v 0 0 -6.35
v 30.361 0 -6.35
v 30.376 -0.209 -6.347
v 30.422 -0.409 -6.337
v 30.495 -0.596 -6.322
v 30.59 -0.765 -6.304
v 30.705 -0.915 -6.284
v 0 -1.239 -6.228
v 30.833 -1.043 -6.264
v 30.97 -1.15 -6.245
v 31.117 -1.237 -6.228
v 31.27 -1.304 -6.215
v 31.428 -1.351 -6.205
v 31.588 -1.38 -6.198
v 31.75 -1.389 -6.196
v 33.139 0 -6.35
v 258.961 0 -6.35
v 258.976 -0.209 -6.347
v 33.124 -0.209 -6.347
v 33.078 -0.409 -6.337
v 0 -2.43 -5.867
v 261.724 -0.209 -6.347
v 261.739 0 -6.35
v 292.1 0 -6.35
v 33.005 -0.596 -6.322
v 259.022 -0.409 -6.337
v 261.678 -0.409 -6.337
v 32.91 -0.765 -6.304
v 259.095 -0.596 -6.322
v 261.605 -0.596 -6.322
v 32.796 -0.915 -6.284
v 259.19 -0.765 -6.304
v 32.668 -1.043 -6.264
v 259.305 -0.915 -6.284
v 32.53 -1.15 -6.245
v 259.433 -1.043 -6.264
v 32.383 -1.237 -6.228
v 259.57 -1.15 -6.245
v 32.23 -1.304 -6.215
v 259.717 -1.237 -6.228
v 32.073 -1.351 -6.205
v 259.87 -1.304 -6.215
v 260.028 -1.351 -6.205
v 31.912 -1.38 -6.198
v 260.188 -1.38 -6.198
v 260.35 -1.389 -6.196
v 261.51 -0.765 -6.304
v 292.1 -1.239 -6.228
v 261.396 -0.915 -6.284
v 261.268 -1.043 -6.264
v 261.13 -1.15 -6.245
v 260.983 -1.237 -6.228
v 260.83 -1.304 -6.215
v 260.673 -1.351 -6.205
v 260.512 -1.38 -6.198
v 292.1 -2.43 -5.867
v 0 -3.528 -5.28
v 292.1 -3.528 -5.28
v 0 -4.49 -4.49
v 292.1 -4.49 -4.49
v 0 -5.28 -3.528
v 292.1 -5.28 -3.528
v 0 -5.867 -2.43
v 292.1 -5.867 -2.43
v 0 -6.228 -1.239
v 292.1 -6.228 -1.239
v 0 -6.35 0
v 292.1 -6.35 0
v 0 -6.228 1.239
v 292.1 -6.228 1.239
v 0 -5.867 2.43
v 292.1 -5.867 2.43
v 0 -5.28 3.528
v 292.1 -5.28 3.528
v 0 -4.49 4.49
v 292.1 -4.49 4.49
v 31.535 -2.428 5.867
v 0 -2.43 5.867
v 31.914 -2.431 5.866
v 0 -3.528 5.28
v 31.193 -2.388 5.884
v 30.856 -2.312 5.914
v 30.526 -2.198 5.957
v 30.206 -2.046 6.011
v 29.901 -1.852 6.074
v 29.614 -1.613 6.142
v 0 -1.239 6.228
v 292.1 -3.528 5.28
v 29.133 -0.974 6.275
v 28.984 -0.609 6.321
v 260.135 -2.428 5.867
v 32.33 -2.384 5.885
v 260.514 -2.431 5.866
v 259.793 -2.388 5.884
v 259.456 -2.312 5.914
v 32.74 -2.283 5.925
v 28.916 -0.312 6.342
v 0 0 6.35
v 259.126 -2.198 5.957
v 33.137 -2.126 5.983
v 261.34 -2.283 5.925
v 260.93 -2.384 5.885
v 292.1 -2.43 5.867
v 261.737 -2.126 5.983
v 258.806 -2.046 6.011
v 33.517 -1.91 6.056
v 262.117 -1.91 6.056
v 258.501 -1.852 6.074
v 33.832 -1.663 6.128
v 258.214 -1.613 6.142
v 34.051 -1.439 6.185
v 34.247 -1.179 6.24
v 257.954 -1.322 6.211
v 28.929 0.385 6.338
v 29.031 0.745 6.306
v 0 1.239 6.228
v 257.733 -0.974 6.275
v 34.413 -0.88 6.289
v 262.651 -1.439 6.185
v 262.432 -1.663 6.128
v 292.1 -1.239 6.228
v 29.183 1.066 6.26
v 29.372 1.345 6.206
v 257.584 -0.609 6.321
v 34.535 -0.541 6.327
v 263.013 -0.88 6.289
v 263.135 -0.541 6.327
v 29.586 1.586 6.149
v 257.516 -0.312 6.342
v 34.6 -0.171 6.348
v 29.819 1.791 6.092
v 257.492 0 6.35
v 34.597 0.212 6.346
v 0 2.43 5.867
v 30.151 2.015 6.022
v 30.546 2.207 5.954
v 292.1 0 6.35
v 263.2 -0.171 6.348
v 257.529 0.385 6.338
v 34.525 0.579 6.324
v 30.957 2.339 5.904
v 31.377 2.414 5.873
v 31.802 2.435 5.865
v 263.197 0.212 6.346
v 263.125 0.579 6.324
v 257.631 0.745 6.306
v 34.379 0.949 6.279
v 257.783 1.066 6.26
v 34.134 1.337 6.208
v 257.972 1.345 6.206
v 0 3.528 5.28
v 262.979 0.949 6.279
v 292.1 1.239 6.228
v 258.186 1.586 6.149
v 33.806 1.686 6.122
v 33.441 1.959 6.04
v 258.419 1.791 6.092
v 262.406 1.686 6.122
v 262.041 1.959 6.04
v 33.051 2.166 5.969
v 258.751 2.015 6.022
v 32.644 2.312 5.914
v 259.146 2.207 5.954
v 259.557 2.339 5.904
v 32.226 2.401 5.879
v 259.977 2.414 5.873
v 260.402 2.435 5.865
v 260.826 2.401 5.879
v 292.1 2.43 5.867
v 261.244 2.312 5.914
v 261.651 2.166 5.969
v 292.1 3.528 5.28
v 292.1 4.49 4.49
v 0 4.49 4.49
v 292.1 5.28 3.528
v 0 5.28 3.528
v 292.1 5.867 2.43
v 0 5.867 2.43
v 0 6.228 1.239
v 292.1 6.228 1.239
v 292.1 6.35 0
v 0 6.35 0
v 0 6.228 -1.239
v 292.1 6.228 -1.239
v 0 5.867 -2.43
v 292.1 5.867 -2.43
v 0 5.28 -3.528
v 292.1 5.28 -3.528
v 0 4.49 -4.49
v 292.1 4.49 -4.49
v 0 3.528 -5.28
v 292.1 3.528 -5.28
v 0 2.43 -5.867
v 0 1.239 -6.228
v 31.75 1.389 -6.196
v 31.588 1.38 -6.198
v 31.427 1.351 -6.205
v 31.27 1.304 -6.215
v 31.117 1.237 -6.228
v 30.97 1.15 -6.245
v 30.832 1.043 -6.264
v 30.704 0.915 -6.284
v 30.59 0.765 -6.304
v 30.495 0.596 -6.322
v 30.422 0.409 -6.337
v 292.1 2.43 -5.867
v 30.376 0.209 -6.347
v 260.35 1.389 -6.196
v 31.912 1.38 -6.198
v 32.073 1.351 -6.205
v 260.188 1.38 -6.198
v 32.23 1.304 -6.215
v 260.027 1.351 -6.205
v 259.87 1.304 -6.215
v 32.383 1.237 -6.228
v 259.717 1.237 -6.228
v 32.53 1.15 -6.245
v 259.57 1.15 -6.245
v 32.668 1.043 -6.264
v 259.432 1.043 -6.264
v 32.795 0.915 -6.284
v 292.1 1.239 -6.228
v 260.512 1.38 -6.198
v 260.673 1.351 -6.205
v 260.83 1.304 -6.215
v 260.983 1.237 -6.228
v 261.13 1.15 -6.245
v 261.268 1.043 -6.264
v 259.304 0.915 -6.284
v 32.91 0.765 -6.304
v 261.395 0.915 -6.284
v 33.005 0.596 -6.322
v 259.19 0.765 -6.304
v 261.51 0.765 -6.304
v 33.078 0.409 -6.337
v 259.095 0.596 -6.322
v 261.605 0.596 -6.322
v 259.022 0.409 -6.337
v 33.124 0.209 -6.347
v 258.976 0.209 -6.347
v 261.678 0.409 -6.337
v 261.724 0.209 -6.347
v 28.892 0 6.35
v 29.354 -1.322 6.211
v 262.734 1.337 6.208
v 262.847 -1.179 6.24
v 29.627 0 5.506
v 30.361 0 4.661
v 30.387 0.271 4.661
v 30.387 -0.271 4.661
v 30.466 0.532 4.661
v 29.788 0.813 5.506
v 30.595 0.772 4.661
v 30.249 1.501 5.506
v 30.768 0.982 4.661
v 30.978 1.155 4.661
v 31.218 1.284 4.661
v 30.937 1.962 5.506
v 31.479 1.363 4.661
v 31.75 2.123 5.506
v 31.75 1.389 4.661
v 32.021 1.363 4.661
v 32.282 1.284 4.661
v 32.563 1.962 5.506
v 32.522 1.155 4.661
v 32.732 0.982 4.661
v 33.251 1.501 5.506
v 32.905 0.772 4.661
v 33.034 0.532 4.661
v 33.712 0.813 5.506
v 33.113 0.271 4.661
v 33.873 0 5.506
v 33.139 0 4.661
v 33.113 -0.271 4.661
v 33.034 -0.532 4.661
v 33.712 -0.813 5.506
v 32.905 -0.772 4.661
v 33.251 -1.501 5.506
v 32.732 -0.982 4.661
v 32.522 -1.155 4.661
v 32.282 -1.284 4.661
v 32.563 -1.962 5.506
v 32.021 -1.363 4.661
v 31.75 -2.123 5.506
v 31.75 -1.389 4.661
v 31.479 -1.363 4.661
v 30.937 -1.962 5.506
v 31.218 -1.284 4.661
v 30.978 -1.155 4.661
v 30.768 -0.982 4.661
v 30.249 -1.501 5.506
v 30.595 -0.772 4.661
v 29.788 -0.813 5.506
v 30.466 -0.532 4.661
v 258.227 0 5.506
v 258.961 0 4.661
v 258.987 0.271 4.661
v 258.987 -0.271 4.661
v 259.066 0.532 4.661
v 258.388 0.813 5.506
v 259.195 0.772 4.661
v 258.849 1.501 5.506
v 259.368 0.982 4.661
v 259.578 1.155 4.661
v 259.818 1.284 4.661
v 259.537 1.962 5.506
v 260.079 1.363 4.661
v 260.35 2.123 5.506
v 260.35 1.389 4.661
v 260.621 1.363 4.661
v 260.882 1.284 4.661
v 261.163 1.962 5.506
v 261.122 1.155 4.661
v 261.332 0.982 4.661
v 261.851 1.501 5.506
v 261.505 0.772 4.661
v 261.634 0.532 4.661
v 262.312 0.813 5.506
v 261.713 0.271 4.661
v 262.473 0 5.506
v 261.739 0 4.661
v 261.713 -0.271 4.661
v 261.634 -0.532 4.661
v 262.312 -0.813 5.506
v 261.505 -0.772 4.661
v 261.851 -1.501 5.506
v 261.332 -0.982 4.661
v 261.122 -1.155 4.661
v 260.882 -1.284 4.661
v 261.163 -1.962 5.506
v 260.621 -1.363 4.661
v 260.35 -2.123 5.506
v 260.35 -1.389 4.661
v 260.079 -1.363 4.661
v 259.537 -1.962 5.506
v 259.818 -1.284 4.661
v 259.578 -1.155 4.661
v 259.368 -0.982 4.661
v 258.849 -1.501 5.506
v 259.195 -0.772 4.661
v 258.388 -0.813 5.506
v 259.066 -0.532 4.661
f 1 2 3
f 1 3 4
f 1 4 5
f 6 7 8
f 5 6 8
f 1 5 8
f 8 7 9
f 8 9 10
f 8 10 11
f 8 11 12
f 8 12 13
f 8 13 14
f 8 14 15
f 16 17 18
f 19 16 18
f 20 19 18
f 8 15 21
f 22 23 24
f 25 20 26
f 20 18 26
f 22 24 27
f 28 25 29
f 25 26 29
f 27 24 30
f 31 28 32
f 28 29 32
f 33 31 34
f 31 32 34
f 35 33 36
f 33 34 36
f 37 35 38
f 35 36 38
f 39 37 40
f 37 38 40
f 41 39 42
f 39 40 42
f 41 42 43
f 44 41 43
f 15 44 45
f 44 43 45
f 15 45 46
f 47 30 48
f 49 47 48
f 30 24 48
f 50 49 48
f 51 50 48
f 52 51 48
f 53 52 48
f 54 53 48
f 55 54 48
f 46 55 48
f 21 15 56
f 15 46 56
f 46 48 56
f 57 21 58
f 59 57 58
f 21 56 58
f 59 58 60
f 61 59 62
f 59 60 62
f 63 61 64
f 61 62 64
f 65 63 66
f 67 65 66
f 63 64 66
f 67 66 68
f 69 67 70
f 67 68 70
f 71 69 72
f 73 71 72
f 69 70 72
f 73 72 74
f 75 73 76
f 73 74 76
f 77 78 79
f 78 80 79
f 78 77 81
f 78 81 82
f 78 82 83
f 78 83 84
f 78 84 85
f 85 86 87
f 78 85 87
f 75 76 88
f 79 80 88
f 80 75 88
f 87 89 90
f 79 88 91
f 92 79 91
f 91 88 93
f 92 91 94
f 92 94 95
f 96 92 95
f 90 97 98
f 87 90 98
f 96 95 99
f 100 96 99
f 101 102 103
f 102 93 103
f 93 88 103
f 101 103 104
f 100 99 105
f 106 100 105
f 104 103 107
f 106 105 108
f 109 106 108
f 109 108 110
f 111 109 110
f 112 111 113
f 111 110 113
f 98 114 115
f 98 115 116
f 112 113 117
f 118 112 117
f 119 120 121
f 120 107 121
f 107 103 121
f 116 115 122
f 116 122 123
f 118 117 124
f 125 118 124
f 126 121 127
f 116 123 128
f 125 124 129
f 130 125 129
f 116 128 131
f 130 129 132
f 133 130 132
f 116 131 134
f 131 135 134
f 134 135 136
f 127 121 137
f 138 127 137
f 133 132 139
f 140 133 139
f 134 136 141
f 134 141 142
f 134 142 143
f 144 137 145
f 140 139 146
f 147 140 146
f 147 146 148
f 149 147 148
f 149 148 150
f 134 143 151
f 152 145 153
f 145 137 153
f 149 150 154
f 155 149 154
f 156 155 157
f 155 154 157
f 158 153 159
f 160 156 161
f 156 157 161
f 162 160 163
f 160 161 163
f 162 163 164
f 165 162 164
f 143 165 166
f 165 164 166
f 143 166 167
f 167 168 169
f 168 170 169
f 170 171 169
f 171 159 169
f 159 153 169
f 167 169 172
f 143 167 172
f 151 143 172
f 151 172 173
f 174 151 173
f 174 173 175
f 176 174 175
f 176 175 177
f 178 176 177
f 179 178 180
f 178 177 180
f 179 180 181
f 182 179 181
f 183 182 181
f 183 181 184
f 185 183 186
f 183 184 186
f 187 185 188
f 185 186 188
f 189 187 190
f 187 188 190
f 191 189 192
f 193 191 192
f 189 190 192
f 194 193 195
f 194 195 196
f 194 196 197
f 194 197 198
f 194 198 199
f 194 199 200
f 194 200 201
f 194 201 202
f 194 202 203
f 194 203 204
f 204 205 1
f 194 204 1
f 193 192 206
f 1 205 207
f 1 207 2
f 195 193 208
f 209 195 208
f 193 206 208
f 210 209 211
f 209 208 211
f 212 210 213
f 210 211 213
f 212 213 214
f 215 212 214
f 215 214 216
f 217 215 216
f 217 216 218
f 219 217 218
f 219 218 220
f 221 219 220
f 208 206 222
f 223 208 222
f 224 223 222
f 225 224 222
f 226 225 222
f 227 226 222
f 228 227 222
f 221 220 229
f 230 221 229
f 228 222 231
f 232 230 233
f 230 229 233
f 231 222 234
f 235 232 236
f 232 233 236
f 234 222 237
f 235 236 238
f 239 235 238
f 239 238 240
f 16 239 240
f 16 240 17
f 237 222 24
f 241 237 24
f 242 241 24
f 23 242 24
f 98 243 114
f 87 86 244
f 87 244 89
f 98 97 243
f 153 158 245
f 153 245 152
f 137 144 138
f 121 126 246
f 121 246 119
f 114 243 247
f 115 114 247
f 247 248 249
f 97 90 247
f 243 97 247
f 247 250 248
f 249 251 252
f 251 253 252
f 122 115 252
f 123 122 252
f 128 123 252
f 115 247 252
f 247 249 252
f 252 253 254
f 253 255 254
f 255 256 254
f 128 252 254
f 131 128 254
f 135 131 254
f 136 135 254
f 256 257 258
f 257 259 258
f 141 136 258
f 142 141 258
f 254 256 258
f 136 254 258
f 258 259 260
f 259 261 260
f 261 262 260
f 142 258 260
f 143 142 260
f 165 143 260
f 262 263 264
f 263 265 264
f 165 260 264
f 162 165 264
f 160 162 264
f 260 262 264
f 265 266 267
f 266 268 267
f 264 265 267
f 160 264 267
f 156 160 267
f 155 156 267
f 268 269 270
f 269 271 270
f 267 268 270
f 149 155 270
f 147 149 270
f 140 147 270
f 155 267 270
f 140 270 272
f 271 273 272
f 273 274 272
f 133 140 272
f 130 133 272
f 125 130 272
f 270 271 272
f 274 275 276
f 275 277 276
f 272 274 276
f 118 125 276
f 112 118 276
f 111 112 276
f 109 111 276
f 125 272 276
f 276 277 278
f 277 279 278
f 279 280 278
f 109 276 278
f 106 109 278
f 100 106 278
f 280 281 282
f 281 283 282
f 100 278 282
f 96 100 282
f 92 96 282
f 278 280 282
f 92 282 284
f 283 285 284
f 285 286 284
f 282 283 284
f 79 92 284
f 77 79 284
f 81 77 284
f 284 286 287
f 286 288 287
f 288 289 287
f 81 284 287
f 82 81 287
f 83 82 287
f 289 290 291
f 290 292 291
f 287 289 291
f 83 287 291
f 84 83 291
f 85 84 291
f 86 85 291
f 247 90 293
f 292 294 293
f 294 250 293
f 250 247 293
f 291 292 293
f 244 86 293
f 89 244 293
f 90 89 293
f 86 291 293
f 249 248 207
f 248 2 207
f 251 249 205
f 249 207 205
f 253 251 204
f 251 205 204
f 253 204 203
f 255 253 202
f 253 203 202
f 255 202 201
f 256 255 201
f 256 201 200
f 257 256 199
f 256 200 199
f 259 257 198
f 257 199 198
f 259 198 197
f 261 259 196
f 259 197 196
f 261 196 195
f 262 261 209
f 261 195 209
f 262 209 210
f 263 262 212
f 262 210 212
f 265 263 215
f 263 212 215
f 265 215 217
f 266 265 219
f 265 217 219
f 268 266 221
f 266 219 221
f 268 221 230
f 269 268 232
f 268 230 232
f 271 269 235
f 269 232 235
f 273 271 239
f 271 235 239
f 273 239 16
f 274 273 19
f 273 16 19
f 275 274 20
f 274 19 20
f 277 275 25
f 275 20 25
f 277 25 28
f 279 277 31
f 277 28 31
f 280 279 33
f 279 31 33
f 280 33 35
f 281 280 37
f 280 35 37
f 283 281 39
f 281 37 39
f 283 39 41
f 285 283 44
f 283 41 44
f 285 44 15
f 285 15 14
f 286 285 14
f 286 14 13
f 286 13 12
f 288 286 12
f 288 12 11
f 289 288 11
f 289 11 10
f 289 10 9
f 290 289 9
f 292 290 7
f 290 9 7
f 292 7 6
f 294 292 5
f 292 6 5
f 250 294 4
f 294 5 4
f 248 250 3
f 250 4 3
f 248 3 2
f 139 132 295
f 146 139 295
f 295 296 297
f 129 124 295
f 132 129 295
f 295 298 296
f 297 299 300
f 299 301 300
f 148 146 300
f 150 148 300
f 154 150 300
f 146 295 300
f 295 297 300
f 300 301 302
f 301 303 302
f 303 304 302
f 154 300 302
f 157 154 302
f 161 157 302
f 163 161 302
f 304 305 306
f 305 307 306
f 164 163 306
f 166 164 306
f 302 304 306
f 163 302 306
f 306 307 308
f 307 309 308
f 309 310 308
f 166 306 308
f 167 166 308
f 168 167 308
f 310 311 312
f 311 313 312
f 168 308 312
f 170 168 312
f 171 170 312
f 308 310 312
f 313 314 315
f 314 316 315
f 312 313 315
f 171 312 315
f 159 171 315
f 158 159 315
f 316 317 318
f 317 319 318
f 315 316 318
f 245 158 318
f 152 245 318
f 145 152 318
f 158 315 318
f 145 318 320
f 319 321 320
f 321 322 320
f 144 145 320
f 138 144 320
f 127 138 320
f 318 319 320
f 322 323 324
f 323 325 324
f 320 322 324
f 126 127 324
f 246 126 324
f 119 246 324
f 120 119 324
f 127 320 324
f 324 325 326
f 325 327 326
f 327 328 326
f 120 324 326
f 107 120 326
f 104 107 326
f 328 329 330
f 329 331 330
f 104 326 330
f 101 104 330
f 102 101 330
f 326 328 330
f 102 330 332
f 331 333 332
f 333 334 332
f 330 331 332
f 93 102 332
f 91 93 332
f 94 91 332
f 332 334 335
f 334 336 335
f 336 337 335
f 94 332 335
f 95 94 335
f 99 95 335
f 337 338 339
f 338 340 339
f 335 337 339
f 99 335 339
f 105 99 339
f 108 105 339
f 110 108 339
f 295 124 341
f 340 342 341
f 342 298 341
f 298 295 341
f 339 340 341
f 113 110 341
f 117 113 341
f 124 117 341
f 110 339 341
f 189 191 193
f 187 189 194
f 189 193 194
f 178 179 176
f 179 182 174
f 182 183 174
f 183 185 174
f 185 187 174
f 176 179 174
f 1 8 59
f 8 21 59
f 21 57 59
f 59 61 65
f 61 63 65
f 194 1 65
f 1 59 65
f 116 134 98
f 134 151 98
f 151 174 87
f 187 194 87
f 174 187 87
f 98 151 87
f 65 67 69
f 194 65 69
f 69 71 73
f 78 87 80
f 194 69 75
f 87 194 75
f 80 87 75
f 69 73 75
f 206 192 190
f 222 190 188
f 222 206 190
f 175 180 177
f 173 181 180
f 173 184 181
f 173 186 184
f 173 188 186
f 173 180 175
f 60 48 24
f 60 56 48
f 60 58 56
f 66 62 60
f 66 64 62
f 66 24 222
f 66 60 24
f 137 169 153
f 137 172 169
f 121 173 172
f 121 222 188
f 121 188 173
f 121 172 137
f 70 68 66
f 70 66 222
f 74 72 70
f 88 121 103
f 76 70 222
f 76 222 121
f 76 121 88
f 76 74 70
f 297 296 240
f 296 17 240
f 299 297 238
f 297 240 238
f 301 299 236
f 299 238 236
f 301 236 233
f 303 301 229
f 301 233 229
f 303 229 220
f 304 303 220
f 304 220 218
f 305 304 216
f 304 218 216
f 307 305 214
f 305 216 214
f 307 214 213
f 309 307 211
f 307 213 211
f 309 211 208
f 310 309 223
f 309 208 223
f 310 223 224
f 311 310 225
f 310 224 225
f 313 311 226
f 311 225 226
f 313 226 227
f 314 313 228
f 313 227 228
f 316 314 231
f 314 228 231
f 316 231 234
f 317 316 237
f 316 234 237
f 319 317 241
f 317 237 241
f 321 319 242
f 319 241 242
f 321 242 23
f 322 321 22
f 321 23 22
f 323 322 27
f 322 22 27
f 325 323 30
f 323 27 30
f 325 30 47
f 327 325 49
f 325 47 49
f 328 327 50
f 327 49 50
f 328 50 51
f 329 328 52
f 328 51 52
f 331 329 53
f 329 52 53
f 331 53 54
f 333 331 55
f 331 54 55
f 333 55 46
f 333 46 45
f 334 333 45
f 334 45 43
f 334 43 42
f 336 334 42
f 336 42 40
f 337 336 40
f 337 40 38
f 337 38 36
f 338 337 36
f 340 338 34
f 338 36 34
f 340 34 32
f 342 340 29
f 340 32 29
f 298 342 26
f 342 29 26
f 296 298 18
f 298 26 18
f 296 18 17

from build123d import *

# Parameters (mm, degrees)
SKETCH1_W                                         = 292.1
SKETCH1_H                                         = 6.35
CSK_FOR_4_FLAT_HEAD_MACHINE_SCREW_100_D           = 2.77876
CSK_FOR_4_FLAT_HEAD_MACHINE_SCREW_100_CSINK_D     = 5.715
CSK_FOR_4_FLAT_HEAD_MACHINE_SCREW_100_CSINK_ANGLE = 82


with BuildPart() as part:
    # Sketch1 → Revolve1 (revolve)
    with BuildSketch(Plane.XY):
        with Locations((146.05, 3.175)):
            Rectangle(SKETCH1_W, SKETCH1_H)
    revolve(axis=Axis((292.1, 0, 0), (-1, 0, 0)))

    # CSK for #4 Flat Head Machine Screw (100)1 (through all)
    with Locations(Plane.XY.offset(6.35)):
        with Locations((31.75, 0), (260.35, 0)):
            CounterSinkHole(CSK_FOR_4_FLAT_HEAD_MACHINE_SCREW_100_D / 2, CSK_FOR_4_FLAT_HEAD_MACHINE_SCREW_100_CSINK_D / 2, counter_sink_angle=CSK_FOR_4_FLAT_HEAD_MACHINE_SCREW_100_CSINK_ANGLE)


solid = part.part
